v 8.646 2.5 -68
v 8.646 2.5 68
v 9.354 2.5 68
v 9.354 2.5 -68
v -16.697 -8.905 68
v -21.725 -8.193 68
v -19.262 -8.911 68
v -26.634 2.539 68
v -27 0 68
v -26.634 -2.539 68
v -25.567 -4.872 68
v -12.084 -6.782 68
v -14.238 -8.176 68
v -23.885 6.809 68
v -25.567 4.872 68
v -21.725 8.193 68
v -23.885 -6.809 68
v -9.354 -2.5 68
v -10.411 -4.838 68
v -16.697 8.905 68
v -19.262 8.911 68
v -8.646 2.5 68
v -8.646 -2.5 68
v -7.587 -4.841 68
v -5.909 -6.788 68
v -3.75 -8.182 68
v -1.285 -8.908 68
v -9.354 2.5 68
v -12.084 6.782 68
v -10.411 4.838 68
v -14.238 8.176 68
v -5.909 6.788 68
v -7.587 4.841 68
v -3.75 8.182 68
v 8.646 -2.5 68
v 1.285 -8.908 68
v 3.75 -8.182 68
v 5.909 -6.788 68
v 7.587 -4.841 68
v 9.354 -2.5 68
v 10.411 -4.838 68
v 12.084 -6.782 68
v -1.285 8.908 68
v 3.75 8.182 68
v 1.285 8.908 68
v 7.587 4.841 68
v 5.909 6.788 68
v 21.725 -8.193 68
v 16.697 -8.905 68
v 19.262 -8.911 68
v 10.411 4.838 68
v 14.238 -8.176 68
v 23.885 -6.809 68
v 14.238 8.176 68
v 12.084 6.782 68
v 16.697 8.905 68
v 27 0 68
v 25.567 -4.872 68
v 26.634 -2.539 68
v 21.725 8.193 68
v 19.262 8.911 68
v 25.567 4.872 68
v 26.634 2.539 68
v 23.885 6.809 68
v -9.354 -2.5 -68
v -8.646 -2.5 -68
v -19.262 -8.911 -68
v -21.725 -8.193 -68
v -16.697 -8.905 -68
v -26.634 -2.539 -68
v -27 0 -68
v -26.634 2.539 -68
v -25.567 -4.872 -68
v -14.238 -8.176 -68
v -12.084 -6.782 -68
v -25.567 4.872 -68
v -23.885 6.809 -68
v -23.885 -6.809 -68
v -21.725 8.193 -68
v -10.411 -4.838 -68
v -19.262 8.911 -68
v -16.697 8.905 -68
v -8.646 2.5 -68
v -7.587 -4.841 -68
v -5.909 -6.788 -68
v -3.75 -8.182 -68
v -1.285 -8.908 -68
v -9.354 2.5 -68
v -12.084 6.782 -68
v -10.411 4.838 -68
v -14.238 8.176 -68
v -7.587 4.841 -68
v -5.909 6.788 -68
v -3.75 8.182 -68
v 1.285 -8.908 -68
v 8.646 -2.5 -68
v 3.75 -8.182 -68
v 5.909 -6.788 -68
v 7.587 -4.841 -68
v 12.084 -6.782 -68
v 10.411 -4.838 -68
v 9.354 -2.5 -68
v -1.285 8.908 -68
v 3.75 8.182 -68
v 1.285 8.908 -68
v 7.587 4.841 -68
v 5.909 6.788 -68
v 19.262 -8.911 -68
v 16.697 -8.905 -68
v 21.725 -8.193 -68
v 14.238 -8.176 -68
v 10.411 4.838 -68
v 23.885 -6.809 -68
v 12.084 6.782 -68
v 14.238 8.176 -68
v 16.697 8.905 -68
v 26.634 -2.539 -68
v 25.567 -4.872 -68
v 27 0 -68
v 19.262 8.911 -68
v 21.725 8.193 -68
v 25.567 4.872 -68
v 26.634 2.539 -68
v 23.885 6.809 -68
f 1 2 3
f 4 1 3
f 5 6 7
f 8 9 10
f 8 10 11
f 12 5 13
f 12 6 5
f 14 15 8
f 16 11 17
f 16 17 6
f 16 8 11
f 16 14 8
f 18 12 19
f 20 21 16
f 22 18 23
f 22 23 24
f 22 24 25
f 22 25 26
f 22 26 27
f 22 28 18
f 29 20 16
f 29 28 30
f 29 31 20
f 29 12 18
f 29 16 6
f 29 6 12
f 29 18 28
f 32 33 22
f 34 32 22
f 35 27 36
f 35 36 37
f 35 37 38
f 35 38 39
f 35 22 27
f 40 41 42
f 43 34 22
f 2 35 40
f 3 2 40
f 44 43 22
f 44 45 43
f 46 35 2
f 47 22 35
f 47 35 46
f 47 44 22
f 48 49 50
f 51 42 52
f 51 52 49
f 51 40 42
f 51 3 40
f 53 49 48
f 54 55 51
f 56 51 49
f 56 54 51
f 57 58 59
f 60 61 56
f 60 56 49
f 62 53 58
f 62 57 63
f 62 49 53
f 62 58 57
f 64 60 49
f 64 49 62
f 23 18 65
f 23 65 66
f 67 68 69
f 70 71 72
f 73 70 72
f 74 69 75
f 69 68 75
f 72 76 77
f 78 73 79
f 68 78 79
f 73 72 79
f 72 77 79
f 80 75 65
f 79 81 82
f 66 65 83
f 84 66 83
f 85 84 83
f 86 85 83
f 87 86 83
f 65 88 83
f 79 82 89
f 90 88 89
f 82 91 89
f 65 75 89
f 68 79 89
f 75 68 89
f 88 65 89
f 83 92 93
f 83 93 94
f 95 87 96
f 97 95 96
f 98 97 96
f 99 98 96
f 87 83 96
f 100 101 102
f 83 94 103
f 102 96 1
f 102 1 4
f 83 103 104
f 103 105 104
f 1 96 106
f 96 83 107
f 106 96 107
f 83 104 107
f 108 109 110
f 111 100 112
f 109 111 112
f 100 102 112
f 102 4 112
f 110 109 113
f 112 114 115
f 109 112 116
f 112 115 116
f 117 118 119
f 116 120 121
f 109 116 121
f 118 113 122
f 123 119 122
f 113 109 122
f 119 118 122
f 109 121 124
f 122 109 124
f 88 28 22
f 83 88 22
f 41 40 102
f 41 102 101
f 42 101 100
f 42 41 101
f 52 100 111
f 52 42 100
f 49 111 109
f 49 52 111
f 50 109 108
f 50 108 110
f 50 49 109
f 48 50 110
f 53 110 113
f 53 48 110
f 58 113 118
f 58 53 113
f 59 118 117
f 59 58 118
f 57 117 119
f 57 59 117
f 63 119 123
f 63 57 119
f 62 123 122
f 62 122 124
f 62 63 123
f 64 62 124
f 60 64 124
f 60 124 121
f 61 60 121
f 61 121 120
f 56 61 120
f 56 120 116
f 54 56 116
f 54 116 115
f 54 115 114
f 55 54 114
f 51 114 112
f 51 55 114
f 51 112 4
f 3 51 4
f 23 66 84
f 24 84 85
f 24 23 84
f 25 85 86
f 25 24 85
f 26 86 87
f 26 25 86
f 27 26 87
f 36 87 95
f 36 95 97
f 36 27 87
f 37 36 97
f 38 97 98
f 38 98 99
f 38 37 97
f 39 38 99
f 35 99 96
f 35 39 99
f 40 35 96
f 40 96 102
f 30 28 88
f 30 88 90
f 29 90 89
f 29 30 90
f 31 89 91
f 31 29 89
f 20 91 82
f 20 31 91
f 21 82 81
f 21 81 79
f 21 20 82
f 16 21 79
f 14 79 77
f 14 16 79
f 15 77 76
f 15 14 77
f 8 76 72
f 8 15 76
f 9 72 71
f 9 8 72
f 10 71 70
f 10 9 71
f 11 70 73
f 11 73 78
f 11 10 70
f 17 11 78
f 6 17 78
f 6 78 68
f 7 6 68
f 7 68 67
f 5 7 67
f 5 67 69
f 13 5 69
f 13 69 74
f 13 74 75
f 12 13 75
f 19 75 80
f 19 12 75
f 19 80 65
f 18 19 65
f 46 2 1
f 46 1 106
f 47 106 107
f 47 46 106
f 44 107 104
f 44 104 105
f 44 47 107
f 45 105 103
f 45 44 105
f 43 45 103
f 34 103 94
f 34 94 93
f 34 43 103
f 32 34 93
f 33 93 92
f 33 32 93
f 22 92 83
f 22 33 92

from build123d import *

# Parameters (mm, degrees)
F0_R          = 9
F1_DEPTH      = 68
F2_W          = 40
F2_H          = 5
F3_DEPTH      = 68
F3_DEPTH_BACK = 68


with BuildPart() as f1:
    # F0 (on Top) → F1 (new body, symmetric)
    with BuildSketch(Plane.XY):
        with Locations((-18, 0)):
            Circle(F0_R)
    extrude(amount=F1_DEPTH, both=True)



with BuildPart() as f1b:
    # F0 (on Top) → F1, piece 2 (new body, symmetric)
    with BuildSketch(Plane.XY):
        with BuildLine():
            ThreePointArc((27, 0), (18, 9), (9, 0))
            ThreePointArc((9, 0), (18, -9), (27, 0))
        make_face()
    extrude(amount=F1_DEPTH, both=True)


with BuildPart() as f1c:
    # F0 (on Top) → F1, piece 3 (new body, symmetric)
    with BuildSketch(Plane.XY):
        with BuildLine():
            ThreePointArc((9, 0), (0, 9), (-9, 0))
            ThreePointArc((-9, 0), (0, -9), (9, 0))
        make_face()
    extrude(amount=F1_DEPTH, both=True)


with BuildPart() as f1_1:
    add(f1.part)

    add(f1b.part)  # F3 merges F1b

    add(f1c.part)  # F3 merges F1c
    # F2 (on Top) → F3 (join, two sides)
    with BuildSketch(Plane.XY) as f3_sk:
        Rectangle(F2_W, F2_H)
    extrude(amount=F3_DEPTH)
    extrude(f3_sk.sketch, amount=-F3_DEPTH_BACK)


solid = f1_1.part
